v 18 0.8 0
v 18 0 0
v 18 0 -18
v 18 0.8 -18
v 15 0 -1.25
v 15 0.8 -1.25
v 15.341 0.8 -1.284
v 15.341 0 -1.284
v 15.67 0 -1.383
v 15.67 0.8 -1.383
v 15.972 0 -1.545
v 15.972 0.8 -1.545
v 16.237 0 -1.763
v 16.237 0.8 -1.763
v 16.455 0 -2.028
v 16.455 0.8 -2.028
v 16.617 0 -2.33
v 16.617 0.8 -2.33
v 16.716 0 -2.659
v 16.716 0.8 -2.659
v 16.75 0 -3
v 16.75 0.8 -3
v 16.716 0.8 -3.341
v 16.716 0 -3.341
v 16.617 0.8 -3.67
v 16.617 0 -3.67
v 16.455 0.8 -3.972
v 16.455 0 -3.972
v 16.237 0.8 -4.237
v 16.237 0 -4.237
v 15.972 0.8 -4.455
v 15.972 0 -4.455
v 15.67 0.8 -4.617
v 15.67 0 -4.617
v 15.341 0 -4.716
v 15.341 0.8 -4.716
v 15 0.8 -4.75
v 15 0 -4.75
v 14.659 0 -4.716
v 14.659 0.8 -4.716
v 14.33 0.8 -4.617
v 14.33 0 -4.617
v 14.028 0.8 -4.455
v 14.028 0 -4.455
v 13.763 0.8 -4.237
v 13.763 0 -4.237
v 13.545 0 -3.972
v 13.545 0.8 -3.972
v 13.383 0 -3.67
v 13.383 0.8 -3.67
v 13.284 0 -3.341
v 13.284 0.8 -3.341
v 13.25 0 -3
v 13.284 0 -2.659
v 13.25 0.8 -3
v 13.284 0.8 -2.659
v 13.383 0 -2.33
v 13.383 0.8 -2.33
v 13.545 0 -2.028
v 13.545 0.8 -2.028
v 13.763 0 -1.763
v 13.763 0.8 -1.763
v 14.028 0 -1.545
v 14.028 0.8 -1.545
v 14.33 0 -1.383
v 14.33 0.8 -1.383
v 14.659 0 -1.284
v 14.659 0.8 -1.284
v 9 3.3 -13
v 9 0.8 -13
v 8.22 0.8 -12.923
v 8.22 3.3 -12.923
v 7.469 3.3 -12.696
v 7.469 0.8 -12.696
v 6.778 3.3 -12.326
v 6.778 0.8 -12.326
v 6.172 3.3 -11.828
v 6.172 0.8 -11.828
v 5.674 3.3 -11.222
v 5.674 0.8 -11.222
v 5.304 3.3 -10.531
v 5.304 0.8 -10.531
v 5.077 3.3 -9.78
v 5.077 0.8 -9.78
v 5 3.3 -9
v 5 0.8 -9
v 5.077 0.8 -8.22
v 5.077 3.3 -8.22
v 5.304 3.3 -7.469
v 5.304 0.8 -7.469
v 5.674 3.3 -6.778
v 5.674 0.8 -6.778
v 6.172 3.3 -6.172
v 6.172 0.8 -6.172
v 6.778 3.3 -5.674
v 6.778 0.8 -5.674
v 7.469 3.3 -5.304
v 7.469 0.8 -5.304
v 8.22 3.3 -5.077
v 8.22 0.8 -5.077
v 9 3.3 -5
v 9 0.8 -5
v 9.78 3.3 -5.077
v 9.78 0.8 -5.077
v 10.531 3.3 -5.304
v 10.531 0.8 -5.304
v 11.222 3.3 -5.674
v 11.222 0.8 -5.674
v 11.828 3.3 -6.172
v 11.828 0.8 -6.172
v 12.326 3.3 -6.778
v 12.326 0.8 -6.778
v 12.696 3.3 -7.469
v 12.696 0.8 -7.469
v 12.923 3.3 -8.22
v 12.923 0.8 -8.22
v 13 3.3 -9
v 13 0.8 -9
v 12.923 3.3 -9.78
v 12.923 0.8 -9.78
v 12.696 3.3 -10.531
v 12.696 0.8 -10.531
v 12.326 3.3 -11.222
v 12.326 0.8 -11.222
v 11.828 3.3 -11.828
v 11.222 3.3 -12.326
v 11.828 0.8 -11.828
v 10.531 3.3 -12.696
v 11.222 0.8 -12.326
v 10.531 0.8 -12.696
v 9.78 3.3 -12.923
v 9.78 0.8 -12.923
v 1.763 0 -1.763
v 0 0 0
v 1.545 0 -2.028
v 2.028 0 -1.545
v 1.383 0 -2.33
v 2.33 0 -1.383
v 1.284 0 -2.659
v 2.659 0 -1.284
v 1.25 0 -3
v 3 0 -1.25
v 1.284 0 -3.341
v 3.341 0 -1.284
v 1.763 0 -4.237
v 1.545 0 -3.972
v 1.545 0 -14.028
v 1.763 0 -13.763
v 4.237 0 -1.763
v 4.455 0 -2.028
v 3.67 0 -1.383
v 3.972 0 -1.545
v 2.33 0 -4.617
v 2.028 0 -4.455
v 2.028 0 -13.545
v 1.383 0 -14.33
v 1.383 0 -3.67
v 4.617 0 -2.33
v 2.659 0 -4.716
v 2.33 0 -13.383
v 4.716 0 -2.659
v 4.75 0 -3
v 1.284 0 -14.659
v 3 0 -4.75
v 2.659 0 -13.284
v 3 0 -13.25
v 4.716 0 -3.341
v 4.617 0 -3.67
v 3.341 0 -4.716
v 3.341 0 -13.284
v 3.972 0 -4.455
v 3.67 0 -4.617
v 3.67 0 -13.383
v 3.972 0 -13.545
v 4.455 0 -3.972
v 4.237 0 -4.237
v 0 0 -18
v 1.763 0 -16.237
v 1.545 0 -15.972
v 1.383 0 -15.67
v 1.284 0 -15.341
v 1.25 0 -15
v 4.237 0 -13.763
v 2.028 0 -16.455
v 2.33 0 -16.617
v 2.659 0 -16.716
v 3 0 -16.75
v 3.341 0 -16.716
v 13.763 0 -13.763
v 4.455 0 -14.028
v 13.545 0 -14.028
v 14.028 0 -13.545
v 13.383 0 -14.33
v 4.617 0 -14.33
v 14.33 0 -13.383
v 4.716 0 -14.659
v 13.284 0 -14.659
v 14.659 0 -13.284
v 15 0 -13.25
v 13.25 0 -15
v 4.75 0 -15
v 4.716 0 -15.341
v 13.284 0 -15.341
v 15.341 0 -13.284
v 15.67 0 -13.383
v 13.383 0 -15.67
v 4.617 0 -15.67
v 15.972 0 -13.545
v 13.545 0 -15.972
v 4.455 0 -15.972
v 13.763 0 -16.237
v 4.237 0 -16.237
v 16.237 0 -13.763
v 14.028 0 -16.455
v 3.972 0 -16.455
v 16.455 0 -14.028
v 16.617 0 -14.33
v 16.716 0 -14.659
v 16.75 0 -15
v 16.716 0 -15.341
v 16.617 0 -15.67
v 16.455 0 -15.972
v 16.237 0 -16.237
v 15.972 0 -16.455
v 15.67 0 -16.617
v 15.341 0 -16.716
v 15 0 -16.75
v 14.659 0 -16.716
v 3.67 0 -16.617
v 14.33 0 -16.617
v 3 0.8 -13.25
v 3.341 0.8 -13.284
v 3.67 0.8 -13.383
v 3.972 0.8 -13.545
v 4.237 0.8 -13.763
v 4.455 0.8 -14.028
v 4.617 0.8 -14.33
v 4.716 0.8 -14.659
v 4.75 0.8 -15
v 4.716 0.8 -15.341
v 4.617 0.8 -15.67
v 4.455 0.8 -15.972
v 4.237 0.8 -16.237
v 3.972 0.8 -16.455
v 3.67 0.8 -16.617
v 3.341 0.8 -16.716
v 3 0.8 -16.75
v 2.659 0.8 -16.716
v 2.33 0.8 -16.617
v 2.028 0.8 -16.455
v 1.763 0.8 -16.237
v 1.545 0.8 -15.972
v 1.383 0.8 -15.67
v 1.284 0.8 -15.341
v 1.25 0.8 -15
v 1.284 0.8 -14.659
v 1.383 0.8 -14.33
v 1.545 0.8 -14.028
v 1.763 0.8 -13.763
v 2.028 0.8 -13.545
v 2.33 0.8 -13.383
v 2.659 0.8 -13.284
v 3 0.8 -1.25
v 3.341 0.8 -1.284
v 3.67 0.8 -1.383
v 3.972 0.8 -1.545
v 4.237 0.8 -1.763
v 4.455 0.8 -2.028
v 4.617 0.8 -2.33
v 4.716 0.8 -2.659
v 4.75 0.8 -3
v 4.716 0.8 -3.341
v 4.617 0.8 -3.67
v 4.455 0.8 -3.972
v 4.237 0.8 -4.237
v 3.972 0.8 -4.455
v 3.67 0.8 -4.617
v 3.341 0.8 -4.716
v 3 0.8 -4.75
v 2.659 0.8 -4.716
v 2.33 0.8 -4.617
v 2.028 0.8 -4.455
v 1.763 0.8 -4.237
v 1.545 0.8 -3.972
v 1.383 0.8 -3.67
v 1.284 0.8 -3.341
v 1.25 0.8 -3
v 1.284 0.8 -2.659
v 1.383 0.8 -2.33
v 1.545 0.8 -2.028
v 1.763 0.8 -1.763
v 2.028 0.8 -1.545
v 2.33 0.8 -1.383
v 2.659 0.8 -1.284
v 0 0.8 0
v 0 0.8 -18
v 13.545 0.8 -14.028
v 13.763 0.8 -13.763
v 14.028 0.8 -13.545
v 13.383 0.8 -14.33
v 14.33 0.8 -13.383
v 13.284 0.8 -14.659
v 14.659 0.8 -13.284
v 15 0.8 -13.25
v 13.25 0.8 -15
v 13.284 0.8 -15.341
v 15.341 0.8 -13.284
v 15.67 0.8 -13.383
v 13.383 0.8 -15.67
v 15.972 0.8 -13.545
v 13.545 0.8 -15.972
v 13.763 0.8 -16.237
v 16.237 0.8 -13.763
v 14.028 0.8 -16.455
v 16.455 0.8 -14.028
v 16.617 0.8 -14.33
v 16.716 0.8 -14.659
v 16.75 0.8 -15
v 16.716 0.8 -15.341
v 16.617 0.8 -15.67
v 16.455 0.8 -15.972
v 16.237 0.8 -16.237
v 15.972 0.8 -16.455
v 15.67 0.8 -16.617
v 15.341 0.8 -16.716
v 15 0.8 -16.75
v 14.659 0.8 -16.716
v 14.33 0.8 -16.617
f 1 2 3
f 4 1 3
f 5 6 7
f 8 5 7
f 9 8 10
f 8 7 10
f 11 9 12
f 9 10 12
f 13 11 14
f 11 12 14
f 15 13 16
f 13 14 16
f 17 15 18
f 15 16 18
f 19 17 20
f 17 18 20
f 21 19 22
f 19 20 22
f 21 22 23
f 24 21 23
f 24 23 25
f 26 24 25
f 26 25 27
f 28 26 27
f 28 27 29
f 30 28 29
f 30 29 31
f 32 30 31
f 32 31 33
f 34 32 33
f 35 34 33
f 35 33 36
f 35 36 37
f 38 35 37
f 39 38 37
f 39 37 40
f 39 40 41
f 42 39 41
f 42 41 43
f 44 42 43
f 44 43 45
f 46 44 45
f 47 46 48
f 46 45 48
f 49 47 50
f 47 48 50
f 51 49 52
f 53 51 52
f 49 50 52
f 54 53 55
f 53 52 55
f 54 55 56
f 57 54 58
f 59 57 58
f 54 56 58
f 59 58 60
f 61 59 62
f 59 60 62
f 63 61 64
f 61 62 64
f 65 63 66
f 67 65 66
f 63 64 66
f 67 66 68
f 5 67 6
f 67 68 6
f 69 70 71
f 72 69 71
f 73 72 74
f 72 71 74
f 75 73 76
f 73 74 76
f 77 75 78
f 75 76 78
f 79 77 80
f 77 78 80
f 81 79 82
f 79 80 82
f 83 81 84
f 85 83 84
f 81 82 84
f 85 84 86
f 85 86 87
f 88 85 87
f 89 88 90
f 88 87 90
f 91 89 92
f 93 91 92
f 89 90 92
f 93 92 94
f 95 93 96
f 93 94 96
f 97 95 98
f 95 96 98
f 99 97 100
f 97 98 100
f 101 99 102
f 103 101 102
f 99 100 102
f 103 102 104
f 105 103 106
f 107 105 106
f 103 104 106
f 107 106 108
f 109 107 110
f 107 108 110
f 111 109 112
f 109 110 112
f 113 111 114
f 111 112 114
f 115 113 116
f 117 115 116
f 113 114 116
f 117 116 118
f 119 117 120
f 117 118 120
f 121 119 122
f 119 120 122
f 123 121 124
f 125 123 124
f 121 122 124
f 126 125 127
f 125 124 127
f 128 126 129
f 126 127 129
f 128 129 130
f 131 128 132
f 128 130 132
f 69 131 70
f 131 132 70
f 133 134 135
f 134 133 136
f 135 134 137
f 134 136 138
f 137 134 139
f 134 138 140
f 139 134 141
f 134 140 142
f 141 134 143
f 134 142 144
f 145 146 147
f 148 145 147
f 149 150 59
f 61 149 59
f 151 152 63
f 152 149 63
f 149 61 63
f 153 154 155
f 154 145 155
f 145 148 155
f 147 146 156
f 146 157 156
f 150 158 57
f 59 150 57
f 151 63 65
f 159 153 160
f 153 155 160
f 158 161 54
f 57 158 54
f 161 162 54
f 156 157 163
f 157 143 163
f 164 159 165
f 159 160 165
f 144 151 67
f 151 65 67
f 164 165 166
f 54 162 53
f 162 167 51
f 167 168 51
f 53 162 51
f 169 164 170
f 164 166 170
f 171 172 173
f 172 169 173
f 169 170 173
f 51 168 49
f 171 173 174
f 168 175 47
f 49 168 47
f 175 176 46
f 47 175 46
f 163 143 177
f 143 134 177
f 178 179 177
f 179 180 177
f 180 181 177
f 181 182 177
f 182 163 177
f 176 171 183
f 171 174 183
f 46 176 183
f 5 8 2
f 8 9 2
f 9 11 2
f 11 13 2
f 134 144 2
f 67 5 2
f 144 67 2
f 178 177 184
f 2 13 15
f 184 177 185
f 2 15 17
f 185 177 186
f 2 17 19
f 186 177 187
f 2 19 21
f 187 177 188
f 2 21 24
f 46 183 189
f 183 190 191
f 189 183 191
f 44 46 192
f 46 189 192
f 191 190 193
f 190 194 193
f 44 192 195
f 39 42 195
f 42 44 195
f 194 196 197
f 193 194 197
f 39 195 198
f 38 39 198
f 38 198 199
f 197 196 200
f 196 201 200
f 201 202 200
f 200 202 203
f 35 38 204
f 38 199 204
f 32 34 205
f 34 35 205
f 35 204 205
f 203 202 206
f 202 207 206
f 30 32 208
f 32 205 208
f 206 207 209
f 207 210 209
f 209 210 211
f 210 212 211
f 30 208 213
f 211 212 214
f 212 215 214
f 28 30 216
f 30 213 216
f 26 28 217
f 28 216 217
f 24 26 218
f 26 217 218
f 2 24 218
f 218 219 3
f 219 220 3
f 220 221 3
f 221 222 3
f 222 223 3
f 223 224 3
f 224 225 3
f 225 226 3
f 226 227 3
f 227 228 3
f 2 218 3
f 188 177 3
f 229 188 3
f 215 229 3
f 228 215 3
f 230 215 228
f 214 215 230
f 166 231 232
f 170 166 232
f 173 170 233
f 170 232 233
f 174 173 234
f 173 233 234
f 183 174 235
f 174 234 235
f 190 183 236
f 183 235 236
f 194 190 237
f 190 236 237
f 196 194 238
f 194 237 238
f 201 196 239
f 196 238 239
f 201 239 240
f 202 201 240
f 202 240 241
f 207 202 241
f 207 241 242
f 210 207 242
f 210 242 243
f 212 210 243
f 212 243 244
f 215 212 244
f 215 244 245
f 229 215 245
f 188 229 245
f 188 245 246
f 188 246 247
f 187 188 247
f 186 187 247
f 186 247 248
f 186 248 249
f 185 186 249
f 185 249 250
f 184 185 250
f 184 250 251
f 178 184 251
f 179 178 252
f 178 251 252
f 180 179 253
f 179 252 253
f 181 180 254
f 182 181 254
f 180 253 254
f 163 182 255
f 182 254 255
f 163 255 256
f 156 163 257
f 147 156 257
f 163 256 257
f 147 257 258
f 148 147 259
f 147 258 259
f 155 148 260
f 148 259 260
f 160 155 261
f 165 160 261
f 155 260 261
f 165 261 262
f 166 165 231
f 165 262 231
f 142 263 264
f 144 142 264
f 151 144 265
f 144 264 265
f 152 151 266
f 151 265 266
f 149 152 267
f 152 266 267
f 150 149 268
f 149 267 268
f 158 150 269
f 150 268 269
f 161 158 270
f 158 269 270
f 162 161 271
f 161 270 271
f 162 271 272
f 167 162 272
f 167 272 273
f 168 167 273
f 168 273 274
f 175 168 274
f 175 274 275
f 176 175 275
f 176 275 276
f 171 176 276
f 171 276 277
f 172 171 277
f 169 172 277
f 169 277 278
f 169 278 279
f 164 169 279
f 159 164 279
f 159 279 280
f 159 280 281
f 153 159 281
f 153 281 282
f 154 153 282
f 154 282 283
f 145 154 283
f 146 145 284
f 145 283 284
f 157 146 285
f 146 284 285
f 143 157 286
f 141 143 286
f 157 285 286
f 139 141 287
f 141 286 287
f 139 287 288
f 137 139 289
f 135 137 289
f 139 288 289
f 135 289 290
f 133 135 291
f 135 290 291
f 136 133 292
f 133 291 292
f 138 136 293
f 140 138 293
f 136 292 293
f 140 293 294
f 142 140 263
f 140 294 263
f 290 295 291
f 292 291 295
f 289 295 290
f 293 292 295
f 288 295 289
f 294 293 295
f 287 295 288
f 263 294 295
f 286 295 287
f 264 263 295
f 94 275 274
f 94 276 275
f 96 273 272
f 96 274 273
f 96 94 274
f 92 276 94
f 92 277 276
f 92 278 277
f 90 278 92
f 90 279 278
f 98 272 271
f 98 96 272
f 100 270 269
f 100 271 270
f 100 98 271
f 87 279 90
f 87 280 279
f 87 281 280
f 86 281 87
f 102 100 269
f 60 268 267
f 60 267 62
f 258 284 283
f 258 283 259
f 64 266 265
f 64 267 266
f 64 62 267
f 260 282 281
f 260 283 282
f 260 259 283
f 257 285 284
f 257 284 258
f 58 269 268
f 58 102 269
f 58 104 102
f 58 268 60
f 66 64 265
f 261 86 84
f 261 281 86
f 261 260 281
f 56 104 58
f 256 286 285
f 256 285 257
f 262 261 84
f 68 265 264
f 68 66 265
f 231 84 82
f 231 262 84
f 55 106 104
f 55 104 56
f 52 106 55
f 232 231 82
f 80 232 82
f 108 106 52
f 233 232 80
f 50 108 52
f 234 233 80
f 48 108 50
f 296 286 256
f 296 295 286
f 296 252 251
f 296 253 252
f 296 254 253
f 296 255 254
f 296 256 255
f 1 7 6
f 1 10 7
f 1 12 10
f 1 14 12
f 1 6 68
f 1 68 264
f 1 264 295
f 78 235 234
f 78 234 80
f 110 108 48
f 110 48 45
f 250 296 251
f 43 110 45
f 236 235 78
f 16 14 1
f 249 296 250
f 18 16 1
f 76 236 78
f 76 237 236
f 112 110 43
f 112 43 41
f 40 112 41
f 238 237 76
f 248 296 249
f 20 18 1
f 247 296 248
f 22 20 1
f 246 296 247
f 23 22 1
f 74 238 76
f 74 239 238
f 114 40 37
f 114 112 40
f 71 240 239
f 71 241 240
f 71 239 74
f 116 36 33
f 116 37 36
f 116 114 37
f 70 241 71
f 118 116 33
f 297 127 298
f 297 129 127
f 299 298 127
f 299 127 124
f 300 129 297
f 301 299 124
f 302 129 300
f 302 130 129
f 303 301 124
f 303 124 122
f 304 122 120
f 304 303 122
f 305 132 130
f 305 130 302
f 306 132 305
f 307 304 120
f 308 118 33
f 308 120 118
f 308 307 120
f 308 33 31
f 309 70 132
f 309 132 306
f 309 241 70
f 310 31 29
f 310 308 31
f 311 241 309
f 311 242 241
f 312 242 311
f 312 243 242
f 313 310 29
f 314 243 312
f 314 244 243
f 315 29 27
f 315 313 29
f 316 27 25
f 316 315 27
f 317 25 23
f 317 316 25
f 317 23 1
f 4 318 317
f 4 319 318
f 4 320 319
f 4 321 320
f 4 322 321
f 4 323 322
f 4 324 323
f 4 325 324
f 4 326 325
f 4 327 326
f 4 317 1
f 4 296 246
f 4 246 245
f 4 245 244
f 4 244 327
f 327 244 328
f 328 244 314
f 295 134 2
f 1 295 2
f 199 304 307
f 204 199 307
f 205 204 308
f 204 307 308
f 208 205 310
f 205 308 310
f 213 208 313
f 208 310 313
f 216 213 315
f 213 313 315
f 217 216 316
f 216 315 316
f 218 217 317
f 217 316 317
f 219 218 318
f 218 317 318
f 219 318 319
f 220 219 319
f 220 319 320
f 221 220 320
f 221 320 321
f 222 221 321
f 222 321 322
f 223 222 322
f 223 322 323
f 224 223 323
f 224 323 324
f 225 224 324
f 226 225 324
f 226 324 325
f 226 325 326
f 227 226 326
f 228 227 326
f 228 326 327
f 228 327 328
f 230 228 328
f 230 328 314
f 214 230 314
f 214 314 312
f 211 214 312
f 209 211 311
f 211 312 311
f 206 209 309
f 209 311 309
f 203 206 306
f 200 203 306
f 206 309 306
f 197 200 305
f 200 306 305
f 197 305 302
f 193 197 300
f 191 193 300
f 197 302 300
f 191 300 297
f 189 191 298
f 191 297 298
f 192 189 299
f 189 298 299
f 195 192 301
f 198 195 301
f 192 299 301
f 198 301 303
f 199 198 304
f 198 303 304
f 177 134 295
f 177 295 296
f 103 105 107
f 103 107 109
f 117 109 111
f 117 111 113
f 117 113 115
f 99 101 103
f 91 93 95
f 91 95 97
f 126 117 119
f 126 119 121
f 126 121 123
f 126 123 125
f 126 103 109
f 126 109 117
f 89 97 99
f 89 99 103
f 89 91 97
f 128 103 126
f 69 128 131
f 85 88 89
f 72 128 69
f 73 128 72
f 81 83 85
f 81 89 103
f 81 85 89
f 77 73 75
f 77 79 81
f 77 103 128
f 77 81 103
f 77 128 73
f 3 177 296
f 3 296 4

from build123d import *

# Parameters (mm, degrees)
SKETCH_1_W          = 18
SKETCH_1_H          = 18
EXTRUDE_1_DEPTH     = 0.8
SKETCH_2_R          = 1.75
CUT_EXTRUDE_1_DEPTH = 26.468411808
SKETCH_3_R          = 4
EXTRUDE_2_DEPTH     = 2.5


with BuildPart() as part:
    # 草图1 → 凸台-拉伸1 (new body)
    with BuildSketch(Plane(origin=(0, 0, 0), x_dir=(1, 0, 0), z_dir=(0, 1, 0))):
        with Locations((9, 9)):
            Rectangle(SKETCH_1_W, SKETCH_1_H)
    extrude(amount=EXTRUDE_1_DEPTH)

    # 草图2 → 切除-拉伸1 (cut, through all)
    with BuildSketch(Plane(origin=(0, 0.8, 0), x_dir=(1, 0, 0), z_dir=(0, 1, 0))):
        with Locations(Location((3, 15, 0), (0, 0, 270))):
            Circle(SKETCH_2_R)
        with Locations(Location((15, 15, 0), (0, 0, 270))):
            Circle(SKETCH_2_R)
        with Locations(Location((15, 3, 0), (0, 0, 270))):
            Circle(SKETCH_2_R)
        with Locations(Location((3, 3, 0), (0, 0, 270))):
            Circle(SKETCH_2_R)
    extrude(amount=-CUT_EXTRUDE_1_DEPTH, mode=Mode.SUBTRACT)

    # 草图3 → 凸台-拉伸2 (add)
    with BuildSketch(Plane(origin=(0, 0.8, 0), x_dir=(1, 0, 0), z_dir=(0, 1, 0))):
        with Locations(Location((9, 9, 0), (0, 0, 90))):
            Circle(SKETCH_3_R)
    extrude(amount=EXTRUDE_2_DEPTH)


solid = part.part
